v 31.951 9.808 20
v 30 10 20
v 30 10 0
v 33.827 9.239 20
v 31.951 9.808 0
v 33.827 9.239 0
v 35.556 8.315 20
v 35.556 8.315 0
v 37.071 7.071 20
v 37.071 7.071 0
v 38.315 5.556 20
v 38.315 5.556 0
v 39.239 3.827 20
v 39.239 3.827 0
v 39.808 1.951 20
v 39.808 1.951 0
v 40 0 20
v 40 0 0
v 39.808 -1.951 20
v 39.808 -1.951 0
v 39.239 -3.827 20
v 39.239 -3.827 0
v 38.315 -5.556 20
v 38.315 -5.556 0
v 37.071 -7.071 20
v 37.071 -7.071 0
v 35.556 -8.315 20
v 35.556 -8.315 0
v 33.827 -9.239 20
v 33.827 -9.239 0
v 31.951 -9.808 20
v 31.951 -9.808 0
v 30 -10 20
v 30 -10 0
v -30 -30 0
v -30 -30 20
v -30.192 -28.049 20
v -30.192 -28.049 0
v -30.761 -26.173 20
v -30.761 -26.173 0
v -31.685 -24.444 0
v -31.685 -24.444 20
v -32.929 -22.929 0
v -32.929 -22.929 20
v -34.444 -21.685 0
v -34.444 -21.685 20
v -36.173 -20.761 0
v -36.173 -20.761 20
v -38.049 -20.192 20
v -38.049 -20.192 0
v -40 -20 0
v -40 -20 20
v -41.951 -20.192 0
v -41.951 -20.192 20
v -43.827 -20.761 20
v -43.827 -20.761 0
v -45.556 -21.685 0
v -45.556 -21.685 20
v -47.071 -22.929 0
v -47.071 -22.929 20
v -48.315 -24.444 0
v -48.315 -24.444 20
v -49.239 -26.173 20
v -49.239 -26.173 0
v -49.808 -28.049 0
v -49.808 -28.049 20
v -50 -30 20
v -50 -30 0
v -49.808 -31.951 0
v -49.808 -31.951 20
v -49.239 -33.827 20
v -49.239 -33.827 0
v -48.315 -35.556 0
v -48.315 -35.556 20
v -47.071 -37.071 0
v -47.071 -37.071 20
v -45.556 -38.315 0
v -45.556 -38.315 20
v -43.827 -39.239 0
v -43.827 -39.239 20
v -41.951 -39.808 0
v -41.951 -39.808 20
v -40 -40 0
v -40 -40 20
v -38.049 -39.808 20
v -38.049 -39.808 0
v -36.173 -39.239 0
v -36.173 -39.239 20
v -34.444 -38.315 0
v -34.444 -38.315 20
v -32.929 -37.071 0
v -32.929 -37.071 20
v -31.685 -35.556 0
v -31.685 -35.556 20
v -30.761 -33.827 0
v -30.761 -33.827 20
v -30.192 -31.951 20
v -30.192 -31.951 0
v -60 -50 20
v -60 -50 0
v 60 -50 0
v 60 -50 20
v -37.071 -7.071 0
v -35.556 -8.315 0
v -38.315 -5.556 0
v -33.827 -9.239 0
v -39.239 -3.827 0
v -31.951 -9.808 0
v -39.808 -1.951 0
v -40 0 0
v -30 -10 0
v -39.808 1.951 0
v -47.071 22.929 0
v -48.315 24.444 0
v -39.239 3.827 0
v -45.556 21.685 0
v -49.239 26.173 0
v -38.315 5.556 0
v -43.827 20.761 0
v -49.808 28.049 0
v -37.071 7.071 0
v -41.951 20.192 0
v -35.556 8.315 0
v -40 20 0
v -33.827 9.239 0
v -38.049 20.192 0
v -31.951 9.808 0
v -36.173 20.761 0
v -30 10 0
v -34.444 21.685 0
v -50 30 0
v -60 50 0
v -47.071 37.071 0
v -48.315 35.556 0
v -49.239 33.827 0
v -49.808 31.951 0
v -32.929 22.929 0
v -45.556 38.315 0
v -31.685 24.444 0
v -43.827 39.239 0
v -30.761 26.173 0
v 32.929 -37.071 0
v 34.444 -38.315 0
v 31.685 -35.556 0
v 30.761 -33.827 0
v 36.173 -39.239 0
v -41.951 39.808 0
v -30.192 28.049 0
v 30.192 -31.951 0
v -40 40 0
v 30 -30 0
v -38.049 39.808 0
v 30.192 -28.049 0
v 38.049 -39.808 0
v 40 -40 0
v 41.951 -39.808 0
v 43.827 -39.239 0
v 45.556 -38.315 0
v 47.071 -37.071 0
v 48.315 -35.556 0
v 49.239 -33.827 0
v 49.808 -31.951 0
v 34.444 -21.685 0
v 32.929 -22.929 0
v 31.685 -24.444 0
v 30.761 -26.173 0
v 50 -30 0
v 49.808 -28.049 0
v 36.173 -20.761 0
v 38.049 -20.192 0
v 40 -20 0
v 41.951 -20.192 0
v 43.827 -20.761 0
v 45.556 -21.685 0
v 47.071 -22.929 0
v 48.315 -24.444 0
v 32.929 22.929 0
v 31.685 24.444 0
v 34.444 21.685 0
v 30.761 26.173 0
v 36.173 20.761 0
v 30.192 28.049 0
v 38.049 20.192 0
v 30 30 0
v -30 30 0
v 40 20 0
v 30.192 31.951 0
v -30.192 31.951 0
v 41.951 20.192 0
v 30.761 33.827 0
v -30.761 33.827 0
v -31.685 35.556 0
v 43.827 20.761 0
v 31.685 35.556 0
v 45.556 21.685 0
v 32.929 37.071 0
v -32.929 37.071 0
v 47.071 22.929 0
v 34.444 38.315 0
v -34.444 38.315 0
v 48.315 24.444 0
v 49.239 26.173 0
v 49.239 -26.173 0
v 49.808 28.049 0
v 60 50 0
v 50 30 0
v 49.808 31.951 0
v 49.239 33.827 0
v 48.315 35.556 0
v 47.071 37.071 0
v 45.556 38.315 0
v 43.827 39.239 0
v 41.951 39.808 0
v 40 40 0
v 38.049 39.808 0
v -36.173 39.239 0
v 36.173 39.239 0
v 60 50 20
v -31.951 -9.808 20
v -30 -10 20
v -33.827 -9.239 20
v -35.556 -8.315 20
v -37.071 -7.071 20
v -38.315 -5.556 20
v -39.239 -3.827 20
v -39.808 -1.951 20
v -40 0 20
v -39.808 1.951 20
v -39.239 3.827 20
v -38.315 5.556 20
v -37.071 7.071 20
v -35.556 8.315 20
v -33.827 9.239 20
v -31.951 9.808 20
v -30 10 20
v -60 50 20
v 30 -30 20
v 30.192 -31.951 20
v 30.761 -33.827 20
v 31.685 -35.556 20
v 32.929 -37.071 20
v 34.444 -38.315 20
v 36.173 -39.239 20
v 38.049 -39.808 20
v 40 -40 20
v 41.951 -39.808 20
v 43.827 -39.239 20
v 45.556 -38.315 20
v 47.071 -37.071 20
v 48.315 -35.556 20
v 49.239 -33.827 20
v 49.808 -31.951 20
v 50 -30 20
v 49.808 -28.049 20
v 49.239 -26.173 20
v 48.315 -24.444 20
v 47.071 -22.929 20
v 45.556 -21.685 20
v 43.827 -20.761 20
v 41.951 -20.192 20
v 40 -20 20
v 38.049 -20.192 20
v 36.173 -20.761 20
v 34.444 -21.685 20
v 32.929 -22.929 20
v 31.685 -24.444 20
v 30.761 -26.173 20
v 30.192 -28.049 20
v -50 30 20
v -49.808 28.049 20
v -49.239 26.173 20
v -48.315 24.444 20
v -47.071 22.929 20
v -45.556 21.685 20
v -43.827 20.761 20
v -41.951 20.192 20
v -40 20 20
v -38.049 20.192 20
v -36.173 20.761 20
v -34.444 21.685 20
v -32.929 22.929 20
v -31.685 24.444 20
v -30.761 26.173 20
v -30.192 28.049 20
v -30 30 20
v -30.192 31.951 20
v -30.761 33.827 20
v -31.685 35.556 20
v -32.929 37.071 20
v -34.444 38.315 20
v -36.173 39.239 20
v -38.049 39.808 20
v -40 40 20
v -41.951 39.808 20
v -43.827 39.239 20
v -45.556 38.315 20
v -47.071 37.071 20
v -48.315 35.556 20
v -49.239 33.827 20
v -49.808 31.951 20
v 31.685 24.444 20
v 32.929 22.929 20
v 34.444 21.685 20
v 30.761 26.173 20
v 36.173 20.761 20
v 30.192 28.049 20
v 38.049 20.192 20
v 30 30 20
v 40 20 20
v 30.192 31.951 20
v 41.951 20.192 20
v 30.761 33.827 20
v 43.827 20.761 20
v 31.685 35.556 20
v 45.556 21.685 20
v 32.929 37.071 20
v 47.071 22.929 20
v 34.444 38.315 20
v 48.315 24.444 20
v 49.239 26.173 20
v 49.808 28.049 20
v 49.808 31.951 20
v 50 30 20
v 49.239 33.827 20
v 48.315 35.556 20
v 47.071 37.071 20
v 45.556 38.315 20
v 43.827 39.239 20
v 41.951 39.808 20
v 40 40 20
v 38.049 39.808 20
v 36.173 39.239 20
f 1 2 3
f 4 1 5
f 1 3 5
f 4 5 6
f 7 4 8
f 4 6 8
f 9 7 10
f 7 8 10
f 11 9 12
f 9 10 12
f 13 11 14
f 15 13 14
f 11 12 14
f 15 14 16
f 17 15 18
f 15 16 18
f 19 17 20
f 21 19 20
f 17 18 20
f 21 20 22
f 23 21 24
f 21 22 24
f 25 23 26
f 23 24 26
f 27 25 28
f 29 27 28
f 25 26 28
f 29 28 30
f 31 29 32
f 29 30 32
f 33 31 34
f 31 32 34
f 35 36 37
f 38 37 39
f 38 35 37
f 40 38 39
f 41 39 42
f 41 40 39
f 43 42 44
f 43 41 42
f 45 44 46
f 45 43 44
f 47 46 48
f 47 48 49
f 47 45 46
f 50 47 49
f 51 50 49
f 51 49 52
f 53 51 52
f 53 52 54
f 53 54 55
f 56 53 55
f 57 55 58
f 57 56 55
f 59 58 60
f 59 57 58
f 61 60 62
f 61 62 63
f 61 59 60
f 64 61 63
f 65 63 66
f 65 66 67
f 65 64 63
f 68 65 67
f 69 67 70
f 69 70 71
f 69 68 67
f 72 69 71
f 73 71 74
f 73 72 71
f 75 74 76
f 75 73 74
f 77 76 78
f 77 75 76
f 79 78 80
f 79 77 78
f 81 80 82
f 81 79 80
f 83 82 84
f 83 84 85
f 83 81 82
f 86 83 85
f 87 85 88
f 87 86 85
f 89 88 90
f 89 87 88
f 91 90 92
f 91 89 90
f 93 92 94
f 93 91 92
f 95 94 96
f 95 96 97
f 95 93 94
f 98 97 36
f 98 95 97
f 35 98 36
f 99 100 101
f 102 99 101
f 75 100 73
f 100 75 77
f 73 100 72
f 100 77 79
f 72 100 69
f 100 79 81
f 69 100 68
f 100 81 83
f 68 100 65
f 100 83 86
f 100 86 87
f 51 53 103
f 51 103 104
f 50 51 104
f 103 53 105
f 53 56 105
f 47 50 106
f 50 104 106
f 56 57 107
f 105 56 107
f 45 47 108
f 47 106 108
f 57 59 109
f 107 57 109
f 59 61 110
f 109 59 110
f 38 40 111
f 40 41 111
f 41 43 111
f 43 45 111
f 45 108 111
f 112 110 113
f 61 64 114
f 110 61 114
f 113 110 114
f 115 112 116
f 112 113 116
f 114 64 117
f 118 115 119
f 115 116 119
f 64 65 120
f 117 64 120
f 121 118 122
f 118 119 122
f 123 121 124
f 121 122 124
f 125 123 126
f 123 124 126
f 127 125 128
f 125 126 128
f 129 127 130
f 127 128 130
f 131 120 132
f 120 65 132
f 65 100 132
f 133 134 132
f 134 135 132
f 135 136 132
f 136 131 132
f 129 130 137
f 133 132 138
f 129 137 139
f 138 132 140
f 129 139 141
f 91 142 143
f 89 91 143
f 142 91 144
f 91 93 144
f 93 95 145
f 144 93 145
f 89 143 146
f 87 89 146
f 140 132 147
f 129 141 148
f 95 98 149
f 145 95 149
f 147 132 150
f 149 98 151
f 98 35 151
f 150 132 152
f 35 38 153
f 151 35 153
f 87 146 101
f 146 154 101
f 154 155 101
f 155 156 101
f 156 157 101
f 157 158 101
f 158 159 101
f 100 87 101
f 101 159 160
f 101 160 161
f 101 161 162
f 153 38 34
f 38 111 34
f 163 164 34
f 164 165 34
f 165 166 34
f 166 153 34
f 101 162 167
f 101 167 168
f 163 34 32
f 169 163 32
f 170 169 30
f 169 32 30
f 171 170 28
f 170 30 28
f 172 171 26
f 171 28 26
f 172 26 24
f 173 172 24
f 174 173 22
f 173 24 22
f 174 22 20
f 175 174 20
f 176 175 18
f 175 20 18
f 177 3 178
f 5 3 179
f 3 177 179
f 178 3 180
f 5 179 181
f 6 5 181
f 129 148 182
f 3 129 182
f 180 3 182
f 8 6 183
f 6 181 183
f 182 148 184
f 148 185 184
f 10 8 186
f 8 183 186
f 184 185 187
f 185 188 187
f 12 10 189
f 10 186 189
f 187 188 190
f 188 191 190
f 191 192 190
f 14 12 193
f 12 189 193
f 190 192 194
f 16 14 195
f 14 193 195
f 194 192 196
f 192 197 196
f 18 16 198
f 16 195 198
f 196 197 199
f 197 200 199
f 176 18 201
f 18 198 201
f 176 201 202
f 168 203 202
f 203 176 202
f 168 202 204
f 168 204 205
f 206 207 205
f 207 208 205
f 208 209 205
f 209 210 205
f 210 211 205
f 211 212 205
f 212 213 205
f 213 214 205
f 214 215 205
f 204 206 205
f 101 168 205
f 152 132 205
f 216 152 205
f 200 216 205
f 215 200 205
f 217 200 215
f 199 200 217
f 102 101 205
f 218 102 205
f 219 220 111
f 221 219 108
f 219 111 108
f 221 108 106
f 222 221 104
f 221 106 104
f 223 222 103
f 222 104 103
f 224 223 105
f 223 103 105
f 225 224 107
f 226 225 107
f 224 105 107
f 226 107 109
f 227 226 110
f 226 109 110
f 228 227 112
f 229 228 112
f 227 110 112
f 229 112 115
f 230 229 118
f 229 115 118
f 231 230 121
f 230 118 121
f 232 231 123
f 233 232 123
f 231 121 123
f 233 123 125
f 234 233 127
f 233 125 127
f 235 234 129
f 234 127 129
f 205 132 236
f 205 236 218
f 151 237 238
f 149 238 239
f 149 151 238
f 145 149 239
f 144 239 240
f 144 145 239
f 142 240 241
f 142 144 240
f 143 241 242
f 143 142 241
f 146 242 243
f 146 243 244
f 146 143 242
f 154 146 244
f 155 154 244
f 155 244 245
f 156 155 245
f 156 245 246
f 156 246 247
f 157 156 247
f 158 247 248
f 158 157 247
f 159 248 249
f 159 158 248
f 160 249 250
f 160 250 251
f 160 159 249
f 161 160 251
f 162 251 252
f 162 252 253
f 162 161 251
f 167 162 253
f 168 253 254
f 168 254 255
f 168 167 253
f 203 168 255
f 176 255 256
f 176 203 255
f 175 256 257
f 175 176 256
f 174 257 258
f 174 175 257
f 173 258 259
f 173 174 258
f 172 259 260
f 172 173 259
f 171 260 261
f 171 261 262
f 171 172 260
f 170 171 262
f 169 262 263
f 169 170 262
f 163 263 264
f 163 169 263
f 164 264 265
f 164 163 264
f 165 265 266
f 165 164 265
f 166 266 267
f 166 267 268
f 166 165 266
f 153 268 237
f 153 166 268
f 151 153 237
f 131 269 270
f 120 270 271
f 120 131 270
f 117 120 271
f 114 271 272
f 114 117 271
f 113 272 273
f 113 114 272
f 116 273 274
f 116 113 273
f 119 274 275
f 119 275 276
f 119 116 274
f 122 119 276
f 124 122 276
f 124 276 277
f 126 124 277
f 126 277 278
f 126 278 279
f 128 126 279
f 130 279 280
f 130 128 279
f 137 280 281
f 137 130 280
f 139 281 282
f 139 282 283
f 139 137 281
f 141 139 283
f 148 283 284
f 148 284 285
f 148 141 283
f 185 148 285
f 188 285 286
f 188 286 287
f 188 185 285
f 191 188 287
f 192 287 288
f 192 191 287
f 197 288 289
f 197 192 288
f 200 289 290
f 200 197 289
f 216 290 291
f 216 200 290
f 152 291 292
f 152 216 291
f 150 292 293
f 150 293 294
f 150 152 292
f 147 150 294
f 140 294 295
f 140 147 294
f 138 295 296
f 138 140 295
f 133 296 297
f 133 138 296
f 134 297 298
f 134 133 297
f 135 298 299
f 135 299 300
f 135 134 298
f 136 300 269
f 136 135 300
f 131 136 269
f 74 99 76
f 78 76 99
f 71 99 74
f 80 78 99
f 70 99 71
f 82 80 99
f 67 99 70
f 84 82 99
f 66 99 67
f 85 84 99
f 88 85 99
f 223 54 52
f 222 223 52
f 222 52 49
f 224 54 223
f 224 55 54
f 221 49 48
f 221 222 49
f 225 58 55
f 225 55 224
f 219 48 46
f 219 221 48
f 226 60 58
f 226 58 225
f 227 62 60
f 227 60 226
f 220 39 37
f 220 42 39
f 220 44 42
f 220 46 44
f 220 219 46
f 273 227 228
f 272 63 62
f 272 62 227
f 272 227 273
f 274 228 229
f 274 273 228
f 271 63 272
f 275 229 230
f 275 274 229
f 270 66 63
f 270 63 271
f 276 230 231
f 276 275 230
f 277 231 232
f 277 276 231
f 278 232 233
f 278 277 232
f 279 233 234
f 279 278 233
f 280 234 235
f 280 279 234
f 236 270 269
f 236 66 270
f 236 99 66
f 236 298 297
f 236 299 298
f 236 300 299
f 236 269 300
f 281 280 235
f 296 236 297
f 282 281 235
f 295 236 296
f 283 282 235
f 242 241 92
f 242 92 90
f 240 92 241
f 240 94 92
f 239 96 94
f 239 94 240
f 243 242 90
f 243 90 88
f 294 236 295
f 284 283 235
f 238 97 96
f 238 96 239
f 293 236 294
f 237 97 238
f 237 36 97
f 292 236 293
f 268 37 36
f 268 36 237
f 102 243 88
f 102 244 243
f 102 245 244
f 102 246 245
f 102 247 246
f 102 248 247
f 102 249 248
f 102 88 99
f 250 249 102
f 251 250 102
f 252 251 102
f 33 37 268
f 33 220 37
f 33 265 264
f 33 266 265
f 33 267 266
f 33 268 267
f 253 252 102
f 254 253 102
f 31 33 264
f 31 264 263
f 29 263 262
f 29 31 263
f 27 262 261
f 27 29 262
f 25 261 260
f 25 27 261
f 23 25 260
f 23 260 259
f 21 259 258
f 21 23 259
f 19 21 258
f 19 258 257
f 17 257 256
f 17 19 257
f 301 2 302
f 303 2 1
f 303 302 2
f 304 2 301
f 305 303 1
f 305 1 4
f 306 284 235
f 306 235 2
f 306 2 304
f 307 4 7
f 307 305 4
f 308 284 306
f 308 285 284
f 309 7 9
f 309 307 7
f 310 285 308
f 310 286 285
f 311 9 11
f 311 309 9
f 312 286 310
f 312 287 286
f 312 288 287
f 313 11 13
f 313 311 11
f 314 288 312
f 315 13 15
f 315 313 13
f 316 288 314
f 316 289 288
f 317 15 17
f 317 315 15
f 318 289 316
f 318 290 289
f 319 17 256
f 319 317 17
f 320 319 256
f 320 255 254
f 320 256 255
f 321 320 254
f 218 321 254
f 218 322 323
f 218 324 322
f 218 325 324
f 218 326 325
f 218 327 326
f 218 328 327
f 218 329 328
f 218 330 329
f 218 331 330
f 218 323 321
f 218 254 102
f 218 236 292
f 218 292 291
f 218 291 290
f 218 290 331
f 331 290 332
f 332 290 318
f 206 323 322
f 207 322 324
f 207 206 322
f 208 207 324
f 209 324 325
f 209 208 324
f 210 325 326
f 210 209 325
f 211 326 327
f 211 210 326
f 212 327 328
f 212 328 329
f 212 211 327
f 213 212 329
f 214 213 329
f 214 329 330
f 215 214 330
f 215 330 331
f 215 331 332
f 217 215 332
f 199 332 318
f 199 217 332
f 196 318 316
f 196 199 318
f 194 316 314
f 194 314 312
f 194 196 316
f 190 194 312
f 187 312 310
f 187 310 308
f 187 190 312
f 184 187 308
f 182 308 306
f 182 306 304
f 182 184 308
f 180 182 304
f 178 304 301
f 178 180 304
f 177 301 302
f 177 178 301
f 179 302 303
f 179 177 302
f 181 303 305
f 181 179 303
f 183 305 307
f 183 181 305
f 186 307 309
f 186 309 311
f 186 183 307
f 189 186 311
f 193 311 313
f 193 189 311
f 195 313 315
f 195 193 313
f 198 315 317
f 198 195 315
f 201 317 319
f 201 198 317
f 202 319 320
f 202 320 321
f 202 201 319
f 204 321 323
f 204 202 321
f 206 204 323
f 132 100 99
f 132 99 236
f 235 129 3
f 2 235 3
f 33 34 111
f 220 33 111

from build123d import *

# Parameters (mm, degrees)
SKETCH2_W           = 120
SKETCH2_H           = 100
SKETCH2_R           = 10
BOSS_EXTRUDE1_DEPTH = 20


with BuildPart() as part:
    # Sketch2 → Boss-Extrude1 (new body)
    with BuildSketch(Plane.XY):
        Rectangle(SKETCH2_W, SKETCH2_H)
        with Locations((-40, -30)):
            Circle(SKETCH2_R, mode=Mode.SUBTRACT)
        with Locations(Location((40, -30, 0), (0, 0, 180))):
            Circle(SKETCH2_R, mode=Mode.SUBTRACT)
        with Locations((40, 30)):
            Circle(SKETCH2_R, mode=Mode.SUBTRACT)
        with Locations(Location((-40, 30, 0), (0, 0, 180))):
            Circle(SKETCH2_R, mode=Mode.SUBTRACT)
        with BuildLine():
            Line((-30, 10), (30, 10))
            ThreePointArc((30, 10), (40, 0), (30, -10))
            Line((30, -10), (-30, -10))
            ThreePointArc((-30, -10), (-40, 0), (-30, 10))
        make_face(mode=Mode.SUBTRACT)
    extrude(amount=BOSS_EXTRUDE1_DEPTH)


solid = part.part
